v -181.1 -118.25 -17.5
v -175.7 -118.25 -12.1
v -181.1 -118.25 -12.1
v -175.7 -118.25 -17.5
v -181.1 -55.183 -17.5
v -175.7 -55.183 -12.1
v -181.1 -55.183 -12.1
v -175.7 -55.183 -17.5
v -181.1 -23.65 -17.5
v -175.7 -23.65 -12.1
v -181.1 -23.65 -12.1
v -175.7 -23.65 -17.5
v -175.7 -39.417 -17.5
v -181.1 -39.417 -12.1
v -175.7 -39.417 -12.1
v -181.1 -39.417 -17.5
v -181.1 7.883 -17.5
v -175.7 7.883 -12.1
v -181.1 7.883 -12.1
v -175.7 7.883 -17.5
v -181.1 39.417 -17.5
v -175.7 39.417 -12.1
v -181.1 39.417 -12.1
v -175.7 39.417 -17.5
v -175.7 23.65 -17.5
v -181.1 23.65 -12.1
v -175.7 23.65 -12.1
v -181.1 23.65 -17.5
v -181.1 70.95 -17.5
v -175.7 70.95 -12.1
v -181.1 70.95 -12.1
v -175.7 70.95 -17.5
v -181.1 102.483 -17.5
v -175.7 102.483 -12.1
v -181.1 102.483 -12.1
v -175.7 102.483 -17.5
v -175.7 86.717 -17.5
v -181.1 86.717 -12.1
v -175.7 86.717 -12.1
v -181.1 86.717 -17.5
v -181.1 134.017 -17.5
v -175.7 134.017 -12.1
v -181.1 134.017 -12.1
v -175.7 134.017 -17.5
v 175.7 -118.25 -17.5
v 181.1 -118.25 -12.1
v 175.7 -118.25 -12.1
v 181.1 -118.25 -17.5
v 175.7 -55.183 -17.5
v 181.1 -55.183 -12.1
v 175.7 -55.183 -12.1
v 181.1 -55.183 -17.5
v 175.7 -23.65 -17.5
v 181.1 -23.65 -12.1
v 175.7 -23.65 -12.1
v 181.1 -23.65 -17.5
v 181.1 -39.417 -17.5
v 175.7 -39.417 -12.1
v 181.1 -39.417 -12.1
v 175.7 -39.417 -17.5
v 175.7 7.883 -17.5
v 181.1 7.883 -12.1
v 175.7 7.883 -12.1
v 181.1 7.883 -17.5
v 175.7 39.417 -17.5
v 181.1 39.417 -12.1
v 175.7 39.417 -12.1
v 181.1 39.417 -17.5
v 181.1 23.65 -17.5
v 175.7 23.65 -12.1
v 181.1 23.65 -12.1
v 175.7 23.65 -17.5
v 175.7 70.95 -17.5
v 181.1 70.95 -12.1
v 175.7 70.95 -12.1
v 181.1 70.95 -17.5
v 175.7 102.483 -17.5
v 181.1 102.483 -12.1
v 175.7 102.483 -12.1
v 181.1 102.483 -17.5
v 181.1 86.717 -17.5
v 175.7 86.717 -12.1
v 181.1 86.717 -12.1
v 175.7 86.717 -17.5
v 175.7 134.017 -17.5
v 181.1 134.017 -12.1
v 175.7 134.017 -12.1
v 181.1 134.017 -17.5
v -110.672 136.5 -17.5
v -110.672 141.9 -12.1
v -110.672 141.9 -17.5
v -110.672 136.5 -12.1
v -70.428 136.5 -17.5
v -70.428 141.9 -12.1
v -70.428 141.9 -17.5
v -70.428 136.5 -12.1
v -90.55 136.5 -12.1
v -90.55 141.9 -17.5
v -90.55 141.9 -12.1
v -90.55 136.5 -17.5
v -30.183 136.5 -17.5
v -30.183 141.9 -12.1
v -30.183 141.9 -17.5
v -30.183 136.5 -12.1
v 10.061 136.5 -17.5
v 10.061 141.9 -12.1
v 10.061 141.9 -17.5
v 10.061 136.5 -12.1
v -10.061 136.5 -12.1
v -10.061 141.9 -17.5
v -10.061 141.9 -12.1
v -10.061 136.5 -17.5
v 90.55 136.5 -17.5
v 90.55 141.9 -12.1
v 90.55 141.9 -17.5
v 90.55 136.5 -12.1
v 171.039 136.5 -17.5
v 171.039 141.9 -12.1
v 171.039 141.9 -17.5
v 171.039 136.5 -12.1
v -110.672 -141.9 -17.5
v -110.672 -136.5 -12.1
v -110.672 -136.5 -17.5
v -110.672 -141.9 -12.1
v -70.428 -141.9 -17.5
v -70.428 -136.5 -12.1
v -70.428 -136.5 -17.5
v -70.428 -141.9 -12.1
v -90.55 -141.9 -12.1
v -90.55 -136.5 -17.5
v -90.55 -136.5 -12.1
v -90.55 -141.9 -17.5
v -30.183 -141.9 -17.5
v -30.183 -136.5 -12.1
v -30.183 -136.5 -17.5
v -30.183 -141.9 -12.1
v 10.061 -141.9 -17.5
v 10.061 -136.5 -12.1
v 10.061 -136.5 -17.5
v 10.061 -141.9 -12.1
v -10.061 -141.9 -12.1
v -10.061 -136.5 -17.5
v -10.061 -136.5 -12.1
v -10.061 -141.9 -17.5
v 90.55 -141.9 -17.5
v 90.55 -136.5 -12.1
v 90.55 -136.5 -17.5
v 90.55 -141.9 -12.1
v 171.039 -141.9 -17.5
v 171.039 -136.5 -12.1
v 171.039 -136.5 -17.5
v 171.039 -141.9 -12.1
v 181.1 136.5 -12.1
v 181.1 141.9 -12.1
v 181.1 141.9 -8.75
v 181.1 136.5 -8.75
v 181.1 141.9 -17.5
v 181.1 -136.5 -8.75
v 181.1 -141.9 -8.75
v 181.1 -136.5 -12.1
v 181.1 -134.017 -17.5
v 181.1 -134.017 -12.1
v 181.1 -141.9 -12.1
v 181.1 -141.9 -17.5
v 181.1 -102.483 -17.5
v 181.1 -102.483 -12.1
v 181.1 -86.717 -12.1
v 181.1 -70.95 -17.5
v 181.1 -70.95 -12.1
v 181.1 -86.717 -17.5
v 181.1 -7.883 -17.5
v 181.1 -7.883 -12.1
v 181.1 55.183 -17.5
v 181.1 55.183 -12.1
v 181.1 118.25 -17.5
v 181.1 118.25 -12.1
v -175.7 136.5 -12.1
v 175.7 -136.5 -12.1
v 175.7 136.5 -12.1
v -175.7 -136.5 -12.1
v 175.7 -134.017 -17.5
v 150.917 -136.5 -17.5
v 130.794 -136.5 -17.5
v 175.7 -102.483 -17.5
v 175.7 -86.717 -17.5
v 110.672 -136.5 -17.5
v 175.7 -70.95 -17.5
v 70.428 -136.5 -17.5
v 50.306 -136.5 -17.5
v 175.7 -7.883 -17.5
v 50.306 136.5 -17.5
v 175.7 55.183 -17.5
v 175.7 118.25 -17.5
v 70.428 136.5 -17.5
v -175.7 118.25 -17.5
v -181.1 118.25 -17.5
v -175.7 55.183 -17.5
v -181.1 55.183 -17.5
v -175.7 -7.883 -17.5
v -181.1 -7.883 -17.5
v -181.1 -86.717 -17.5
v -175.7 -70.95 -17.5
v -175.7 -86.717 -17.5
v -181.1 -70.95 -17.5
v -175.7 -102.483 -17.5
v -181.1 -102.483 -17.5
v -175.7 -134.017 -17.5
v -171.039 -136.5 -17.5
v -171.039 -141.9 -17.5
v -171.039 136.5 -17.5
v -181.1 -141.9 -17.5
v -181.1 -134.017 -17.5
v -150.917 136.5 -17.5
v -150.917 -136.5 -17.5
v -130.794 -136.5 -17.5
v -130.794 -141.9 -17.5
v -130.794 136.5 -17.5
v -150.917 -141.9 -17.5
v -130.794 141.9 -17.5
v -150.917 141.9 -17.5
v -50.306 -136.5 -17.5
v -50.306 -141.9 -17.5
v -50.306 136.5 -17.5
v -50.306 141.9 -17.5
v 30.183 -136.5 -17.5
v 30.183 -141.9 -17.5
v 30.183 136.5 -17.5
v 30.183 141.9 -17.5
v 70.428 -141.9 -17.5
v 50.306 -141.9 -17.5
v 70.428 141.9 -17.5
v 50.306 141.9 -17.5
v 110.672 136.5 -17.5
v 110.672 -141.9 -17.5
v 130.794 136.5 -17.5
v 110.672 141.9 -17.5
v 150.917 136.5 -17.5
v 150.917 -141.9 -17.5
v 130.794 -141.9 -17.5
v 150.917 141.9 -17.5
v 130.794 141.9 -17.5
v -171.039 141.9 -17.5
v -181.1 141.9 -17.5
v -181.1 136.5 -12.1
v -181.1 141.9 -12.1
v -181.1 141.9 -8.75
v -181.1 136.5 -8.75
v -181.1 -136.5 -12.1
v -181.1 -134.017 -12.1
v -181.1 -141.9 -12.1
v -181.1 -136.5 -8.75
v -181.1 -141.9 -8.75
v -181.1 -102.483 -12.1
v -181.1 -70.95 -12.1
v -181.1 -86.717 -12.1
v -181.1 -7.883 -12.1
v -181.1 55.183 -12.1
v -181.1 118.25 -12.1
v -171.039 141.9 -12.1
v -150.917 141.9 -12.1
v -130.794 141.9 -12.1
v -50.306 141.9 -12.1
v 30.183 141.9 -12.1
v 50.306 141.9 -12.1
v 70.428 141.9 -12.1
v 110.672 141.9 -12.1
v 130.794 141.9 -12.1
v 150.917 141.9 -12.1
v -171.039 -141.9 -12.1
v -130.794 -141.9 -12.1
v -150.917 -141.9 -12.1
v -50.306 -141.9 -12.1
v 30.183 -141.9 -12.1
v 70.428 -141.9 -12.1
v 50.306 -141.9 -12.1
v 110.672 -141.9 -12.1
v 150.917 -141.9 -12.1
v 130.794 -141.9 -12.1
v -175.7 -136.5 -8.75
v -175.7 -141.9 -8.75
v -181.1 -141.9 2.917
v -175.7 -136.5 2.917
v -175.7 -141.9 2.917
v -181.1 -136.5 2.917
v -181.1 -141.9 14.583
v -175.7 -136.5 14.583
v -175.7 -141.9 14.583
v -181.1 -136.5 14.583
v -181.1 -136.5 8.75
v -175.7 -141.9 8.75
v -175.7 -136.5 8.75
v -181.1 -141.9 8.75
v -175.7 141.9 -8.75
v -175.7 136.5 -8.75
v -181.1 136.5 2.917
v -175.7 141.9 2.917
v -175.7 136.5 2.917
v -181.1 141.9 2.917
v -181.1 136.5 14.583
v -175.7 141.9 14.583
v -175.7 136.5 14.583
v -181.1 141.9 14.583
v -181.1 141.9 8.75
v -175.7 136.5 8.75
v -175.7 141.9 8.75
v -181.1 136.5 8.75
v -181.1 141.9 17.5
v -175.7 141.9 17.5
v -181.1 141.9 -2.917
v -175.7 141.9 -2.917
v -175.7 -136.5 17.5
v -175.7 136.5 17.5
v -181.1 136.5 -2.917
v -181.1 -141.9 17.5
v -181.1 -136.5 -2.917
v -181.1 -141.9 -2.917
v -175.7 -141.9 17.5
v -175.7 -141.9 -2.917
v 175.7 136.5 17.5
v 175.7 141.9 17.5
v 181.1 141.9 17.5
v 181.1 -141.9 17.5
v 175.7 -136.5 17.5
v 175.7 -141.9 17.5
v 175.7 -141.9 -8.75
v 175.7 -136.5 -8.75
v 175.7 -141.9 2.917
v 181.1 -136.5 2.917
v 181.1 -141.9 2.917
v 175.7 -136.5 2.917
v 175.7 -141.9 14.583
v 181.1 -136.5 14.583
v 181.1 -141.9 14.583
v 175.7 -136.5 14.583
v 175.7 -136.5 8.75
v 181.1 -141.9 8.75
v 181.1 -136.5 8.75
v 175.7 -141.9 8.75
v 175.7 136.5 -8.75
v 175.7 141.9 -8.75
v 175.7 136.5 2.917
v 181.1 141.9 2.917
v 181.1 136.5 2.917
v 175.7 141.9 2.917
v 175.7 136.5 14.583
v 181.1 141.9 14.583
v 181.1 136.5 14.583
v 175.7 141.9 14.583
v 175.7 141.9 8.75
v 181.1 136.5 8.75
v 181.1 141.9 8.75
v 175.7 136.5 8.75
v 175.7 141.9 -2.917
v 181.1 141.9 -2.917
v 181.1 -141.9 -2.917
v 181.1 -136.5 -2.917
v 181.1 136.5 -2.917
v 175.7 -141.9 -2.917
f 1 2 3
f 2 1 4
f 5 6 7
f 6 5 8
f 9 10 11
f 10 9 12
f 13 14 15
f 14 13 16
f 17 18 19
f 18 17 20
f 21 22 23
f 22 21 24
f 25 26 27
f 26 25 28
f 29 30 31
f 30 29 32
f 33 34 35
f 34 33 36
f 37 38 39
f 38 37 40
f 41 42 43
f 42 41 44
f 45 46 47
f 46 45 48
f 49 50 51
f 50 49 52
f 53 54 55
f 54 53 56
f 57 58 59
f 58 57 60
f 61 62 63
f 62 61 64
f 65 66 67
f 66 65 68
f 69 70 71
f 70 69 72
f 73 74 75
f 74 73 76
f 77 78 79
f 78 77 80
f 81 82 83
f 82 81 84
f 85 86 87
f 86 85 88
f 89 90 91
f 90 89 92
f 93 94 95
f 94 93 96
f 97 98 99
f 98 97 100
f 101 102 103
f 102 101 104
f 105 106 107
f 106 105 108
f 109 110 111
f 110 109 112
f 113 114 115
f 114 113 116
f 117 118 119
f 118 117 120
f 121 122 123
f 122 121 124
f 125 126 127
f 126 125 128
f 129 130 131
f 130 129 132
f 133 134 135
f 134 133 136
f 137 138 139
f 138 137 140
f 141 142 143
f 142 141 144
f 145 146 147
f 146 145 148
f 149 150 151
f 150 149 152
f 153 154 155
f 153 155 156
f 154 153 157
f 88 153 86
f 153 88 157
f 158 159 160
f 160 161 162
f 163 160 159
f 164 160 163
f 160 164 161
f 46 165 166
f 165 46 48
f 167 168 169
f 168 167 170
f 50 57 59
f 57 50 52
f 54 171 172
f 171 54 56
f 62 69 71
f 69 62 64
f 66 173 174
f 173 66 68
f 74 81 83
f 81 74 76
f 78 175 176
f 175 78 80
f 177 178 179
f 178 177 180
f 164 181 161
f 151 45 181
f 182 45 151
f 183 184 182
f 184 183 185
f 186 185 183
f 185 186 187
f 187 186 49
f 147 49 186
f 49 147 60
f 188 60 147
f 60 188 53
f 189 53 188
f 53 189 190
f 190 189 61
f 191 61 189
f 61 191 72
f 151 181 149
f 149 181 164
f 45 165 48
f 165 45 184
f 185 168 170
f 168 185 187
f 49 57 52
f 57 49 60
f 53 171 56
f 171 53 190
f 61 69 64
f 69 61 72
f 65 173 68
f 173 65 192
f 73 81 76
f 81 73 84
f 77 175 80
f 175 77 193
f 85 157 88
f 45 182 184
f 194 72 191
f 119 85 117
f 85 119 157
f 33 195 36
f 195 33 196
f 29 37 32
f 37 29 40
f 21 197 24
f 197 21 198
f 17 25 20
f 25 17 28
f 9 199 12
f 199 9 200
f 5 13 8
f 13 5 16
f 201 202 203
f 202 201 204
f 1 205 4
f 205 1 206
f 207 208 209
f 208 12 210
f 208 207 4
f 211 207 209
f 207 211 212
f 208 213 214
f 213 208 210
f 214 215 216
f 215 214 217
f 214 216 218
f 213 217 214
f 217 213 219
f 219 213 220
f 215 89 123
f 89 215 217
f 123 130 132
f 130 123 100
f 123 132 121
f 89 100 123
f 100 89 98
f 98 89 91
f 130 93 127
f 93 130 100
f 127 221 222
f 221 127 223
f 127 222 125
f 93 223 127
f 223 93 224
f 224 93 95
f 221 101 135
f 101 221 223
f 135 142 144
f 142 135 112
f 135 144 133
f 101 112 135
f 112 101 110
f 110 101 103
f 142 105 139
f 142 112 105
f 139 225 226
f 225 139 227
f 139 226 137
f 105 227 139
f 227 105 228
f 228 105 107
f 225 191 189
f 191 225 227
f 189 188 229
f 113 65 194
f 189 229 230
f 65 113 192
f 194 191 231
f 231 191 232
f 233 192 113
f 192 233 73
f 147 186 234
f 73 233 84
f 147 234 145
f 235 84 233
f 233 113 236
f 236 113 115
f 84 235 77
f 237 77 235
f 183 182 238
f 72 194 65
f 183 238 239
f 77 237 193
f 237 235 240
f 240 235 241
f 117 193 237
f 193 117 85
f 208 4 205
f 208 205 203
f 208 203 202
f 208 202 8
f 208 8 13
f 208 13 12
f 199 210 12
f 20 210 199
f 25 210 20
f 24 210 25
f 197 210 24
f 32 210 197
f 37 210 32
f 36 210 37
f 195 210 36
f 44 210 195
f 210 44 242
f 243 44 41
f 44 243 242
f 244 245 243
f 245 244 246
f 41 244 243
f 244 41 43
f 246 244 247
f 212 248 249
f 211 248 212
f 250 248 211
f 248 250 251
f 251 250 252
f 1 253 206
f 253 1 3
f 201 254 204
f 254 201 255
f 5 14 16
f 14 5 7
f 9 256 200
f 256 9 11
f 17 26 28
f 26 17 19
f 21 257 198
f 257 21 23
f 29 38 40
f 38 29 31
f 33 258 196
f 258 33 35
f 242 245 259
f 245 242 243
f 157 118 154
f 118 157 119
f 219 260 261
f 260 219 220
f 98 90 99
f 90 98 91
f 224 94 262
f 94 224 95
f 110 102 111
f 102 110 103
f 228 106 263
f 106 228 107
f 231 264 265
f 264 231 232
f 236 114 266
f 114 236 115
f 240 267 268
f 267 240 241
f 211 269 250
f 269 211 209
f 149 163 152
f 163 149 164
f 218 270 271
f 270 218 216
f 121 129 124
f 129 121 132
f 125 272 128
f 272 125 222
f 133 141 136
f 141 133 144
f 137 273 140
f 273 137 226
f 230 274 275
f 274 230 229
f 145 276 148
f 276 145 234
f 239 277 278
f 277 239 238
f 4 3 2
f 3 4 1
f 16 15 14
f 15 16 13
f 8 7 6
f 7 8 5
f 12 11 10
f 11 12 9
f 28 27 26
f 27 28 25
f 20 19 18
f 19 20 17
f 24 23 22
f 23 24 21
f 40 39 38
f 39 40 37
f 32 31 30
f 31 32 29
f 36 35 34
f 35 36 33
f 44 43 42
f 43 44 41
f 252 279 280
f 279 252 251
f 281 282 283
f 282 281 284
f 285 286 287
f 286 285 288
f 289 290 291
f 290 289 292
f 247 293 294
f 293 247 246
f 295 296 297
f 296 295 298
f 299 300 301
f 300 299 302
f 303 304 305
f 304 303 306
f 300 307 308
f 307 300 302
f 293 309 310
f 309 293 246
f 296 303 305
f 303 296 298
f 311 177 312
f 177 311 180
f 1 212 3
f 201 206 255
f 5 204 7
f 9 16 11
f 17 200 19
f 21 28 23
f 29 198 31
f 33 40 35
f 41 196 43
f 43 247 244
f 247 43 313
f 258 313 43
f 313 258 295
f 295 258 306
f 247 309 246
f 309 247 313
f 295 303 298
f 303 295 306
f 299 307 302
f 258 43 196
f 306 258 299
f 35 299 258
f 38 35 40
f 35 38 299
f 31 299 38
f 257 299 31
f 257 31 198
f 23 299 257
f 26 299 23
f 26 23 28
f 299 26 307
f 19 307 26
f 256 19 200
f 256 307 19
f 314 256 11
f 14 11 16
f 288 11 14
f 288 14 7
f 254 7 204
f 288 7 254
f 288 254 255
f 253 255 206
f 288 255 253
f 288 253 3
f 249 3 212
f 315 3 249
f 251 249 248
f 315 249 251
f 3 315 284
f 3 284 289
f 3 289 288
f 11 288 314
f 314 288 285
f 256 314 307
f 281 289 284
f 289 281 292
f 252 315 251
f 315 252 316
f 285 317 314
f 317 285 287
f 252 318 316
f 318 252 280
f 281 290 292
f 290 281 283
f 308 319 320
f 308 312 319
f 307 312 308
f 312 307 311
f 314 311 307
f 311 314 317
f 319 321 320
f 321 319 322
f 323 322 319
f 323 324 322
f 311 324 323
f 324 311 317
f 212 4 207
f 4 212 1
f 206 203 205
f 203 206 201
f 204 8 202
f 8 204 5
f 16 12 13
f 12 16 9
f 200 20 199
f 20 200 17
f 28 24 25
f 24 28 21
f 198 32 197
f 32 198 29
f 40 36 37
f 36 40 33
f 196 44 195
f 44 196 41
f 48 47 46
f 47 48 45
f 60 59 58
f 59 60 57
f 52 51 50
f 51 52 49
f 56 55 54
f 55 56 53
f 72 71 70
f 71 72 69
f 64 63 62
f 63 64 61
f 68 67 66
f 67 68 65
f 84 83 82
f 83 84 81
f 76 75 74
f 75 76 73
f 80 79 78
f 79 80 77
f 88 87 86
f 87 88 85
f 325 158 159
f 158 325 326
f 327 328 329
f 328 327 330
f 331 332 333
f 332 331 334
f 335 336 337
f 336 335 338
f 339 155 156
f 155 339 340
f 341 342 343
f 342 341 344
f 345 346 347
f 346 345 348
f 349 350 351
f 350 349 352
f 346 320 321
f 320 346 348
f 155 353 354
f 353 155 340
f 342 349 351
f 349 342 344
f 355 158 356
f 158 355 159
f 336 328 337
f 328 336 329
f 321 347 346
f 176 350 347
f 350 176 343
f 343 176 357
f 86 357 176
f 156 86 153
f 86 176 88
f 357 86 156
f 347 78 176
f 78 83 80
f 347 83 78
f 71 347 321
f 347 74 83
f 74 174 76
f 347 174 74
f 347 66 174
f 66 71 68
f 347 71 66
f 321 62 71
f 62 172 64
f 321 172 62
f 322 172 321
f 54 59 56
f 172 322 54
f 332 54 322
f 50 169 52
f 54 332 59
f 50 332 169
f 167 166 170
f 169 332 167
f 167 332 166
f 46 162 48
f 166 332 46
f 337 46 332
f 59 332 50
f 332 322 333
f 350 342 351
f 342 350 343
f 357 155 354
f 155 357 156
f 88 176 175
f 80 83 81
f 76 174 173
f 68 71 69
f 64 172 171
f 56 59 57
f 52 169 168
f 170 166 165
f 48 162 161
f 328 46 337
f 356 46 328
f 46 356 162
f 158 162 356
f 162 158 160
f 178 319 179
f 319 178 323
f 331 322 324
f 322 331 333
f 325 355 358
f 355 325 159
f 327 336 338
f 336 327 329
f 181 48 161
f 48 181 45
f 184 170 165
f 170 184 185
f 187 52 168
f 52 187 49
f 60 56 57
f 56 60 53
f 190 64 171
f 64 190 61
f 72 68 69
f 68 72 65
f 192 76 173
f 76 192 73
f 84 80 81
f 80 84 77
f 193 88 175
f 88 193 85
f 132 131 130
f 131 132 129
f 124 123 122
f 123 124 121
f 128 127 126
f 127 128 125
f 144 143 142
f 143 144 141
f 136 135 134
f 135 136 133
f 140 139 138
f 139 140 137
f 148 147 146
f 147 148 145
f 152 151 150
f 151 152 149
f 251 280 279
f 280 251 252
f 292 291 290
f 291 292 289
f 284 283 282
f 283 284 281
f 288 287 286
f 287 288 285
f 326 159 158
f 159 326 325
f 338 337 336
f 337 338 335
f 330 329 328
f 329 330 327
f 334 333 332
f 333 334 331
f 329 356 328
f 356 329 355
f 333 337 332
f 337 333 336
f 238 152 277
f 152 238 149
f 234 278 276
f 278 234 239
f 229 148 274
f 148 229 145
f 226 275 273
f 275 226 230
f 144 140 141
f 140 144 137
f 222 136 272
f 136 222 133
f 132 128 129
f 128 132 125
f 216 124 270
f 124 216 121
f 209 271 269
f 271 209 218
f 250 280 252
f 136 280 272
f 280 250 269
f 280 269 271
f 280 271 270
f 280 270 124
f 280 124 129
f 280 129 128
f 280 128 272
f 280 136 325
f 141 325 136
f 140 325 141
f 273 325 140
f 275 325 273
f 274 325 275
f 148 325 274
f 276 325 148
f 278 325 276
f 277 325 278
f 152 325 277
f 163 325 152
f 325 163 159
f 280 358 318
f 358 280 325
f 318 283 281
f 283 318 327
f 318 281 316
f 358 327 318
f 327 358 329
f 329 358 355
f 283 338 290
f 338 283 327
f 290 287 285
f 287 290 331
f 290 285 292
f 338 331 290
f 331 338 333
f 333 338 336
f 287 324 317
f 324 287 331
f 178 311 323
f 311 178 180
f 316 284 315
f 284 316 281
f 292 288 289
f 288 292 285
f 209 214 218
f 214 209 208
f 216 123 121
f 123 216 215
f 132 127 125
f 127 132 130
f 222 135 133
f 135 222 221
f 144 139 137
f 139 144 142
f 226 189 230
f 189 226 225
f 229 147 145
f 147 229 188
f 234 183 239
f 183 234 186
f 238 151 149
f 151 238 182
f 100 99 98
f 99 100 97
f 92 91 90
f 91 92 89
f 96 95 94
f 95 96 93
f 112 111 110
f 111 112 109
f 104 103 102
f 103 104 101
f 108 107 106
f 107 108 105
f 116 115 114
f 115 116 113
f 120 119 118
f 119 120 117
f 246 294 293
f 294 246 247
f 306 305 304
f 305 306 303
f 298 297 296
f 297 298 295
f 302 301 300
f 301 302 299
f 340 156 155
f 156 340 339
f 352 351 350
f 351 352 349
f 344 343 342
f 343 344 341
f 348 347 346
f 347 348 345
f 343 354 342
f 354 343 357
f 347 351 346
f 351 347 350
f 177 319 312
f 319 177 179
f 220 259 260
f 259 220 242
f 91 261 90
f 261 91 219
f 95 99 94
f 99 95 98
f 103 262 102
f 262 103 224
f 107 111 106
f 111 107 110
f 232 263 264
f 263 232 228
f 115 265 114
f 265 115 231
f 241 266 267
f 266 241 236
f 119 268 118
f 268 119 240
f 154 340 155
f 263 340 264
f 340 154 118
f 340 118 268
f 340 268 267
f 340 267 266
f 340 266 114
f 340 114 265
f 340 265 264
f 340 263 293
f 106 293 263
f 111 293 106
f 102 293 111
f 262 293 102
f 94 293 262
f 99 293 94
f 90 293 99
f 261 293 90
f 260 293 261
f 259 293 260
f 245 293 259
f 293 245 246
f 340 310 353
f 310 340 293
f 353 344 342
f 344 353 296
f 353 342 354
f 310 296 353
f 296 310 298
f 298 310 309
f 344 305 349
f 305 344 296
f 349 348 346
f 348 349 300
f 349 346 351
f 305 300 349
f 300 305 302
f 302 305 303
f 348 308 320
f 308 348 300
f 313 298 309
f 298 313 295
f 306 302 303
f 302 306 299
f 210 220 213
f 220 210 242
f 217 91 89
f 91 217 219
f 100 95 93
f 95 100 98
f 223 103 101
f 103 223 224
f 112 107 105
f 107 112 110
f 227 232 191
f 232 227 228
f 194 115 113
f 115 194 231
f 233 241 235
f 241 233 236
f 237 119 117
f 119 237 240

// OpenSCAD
// file: params.scad
// arguments
laser_beam_width=.005*25.4;
// material_thickness=3;
material_thickness=5.4;
echo("Material thickness: ", material_thickness);
h = 200;
w = 400;
d = 300;

lid_h = 60;

// calculated
bottom_h = h-lid_h;

strut_width=10;
strut_pivot_r=5;
strut_pivot_hole_r=5.5;

rear_strut_sagitta_ratio=3.5;
rear_strut_bottom_dx = 120;
rear_strut_bottom_dy = 50;
rear_strut_top_dx = 50;
rear_strut_top_dy = 0;
rear_strut_max_angle = 175;
// rear_strut_max_angle = 152.5;


rear_strut_delta_x = abs(rear_strut_bottom_dx - rear_strut_top_dx);
rear_strut_delta_y = abs((bottom_h / 2 - rear_strut_bottom_dy) + (lid_h / 2 - rear_strut_top_dy));
rear_strut_length = sqrt(pow(rear_strut_delta_x, 2) + pow(rear_strut_delta_y, 2));
rear_strut_init_angle = asin(rear_strut_delta_y / rear_strut_length);
// rear_strut_max_angle = rear_strut_init_angle;


front_strut_bottom_dx = 50;
front_strut_bottom_dy = 50;
front_strut_top_dx = -130;
front_strut_top_dy = 0;

front_strut_delta_x = abs(front_strut_bottom_dx - front_strut_top_dx);
front_strut_delta_y = abs((bottom_h / 2 - front_strut_bottom_dy) + (lid_h / 2 - front_strut_top_dy));
front_strut_length = sqrt(pow(front_strut_delta_x, 2) + pow(front_strut_delta_y, 2));
front_strut_init_angle = asin(front_strut_delta_y / front_strut_length);
echo("expected front strut init angle:", front_strut_init_angle);

bottom_bar = abs(front_strut_bottom_dx - rear_strut_bottom_dx);
diagonal_len = sqrt(pow(rear_strut_length, 2) + pow(bottom_bar, 2) - 2*rear_strut_length*bottom_bar*cos(rear_strut_max_angle));

echo("Diagonal len:", diagonal_len);

top_bar = abs(front_strut_top_dx - rear_strut_top_dx);
theta_upper = acos(
  (pow(front_strut_length, 2) + pow(diagonal_len, 2) - pow(top_bar, 2))
  /(2*front_strut_length*diagonal_len)
);
x = 
  (pow(diagonal_len, 2) + pow(bottom_bar, 2) - pow(rear_strut_length, 2))
  /(2*diagonal_len*bottom_bar);
theta_lower = acos(min(max(x, -1), 1));
echo("theta_lower:", theta_lower);

front_strut_max_angle = theta_lower + theta_upper;
echo ("front_strut_max_angle", front_strut_max_angle);

lid_angle_top = acos((pow(top_bar, 2) + pow(diagonal_len, 2) - pow(front_strut_length, 2))/(2*top_bar*diagonal_len));
lid_angle_bottom = (180 - rear_strut_max_angle - theta_lower);
lid_angle = lid_angle_top + lid_angle_bottom;
echo("lid_angle:", lid_angle);
// main file
include <params.scad>

tray_h = bottom_h / 4;

tray_w = w - material_thickness * 7;
tray_d = d - material_thickness * 3;

h_teeth = 3;
w_teeth = 9;
d_teeth = 9;

h_tooth_width = tray_h / h_teeth / 2;
w_tooth_width = tray_w / w_teeth / 2;
d_tooth_width = tray_d / d_teeth / 2;

module cutout_array(num_teeth, tooth_width) {
  translate([-num_teeth * tooth_width, 0, 0]) {
    for(i=[0:num_teeth-1]) {
      translate([i * 2 * tooth_width + tooth_width, 0, 0]) cube(size=[tooth_width, material_thickness*2, material_thickness*2], center=true);
    }
  }
}

module inverse_cutout_array(num_teeth, tooth_width) {
  cutout_array(num_teeth+1, tooth_width);
}


module tray_bottom() {
  color([0, 1, 0]) render() difference() {
    cube(size=[tray_w, tray_d, material_thickness], center=true);
    translate([-tray_w / 2, 0, 0]) rotate([0, 0, 90]) cutout_array(d_teeth, d_tooth_width);
    translate([tray_w / 2, 0, 0]) rotate([0, 0, 90]) cutout_array(d_teeth, d_tooth_width);
    translate([0, tray_d / 2, 0]) rotate([0, 0, 0]) cutout_array(w_teeth, w_tooth_width);
    translate([0, -tray_d / 2, 0]) rotate([0, 0, 0]) cutout_array(w_teeth, w_tooth_width);
  }
  
}

module tray_side1() {
  color([1, 0, 0]) render() difference() {
    cube(size=[tray_d, tray_h, material_thickness], center=true);
    translate([0, -tray_h / 2, 0]) inverse_cutout_array(d_teeth, d_tooth_width);
    translate([-tray_d / 2, 0, 0]) rotate([0, 0, 90]) cutout_array(h_teeth, h_tooth_width);
    translate([tray_d / 2, 0, 0]) rotate([0, 0, 90]) cutout_array(h_teeth, h_tooth_width);
  }
  
}

module tray_side2() {
  color([0/255, 0/255, 255/255]) render() difference() {
    cube(size=[tray_w, tray_h, material_thickness], center=true);
    translate([0, -tray_h / 2, 0]) inverse_cutout_array(w_teeth, w_tooth_width);
    translate([-tray_w / 2, 0, 0]) rotate([0, 0, 90]) inverse_cutout_array(h_teeth, h_tooth_width);
    translate([tray_w / 2, 0, 0]) rotate([0, 0, 90]) inverse_cutout_array(h_teeth, h_tooth_width);
  }
  
}

module tray_assembled() {
  translate([0, 0, -tray_h/2 + material_thickness / 2]) tray_bottom();
  translate([-tray_w / 2 + material_thickness / 2, 0, 0]) rotate([90, 0, 90]) tray_side1();
  translate([tray_w / 2 - material_thickness / 2, 0, 0]) rotate([90, 0, 90]) tray_side1();
  translate([0, -tray_d / 2 + material_thickness / 2, 0]) rotate([90, 0, 0]) tray_side2();
  translate([0, tray_d / 2 - material_thickness / 2, 0]) rotate([90, 0, 0]) tray_side2();
}

tray_assembled();
